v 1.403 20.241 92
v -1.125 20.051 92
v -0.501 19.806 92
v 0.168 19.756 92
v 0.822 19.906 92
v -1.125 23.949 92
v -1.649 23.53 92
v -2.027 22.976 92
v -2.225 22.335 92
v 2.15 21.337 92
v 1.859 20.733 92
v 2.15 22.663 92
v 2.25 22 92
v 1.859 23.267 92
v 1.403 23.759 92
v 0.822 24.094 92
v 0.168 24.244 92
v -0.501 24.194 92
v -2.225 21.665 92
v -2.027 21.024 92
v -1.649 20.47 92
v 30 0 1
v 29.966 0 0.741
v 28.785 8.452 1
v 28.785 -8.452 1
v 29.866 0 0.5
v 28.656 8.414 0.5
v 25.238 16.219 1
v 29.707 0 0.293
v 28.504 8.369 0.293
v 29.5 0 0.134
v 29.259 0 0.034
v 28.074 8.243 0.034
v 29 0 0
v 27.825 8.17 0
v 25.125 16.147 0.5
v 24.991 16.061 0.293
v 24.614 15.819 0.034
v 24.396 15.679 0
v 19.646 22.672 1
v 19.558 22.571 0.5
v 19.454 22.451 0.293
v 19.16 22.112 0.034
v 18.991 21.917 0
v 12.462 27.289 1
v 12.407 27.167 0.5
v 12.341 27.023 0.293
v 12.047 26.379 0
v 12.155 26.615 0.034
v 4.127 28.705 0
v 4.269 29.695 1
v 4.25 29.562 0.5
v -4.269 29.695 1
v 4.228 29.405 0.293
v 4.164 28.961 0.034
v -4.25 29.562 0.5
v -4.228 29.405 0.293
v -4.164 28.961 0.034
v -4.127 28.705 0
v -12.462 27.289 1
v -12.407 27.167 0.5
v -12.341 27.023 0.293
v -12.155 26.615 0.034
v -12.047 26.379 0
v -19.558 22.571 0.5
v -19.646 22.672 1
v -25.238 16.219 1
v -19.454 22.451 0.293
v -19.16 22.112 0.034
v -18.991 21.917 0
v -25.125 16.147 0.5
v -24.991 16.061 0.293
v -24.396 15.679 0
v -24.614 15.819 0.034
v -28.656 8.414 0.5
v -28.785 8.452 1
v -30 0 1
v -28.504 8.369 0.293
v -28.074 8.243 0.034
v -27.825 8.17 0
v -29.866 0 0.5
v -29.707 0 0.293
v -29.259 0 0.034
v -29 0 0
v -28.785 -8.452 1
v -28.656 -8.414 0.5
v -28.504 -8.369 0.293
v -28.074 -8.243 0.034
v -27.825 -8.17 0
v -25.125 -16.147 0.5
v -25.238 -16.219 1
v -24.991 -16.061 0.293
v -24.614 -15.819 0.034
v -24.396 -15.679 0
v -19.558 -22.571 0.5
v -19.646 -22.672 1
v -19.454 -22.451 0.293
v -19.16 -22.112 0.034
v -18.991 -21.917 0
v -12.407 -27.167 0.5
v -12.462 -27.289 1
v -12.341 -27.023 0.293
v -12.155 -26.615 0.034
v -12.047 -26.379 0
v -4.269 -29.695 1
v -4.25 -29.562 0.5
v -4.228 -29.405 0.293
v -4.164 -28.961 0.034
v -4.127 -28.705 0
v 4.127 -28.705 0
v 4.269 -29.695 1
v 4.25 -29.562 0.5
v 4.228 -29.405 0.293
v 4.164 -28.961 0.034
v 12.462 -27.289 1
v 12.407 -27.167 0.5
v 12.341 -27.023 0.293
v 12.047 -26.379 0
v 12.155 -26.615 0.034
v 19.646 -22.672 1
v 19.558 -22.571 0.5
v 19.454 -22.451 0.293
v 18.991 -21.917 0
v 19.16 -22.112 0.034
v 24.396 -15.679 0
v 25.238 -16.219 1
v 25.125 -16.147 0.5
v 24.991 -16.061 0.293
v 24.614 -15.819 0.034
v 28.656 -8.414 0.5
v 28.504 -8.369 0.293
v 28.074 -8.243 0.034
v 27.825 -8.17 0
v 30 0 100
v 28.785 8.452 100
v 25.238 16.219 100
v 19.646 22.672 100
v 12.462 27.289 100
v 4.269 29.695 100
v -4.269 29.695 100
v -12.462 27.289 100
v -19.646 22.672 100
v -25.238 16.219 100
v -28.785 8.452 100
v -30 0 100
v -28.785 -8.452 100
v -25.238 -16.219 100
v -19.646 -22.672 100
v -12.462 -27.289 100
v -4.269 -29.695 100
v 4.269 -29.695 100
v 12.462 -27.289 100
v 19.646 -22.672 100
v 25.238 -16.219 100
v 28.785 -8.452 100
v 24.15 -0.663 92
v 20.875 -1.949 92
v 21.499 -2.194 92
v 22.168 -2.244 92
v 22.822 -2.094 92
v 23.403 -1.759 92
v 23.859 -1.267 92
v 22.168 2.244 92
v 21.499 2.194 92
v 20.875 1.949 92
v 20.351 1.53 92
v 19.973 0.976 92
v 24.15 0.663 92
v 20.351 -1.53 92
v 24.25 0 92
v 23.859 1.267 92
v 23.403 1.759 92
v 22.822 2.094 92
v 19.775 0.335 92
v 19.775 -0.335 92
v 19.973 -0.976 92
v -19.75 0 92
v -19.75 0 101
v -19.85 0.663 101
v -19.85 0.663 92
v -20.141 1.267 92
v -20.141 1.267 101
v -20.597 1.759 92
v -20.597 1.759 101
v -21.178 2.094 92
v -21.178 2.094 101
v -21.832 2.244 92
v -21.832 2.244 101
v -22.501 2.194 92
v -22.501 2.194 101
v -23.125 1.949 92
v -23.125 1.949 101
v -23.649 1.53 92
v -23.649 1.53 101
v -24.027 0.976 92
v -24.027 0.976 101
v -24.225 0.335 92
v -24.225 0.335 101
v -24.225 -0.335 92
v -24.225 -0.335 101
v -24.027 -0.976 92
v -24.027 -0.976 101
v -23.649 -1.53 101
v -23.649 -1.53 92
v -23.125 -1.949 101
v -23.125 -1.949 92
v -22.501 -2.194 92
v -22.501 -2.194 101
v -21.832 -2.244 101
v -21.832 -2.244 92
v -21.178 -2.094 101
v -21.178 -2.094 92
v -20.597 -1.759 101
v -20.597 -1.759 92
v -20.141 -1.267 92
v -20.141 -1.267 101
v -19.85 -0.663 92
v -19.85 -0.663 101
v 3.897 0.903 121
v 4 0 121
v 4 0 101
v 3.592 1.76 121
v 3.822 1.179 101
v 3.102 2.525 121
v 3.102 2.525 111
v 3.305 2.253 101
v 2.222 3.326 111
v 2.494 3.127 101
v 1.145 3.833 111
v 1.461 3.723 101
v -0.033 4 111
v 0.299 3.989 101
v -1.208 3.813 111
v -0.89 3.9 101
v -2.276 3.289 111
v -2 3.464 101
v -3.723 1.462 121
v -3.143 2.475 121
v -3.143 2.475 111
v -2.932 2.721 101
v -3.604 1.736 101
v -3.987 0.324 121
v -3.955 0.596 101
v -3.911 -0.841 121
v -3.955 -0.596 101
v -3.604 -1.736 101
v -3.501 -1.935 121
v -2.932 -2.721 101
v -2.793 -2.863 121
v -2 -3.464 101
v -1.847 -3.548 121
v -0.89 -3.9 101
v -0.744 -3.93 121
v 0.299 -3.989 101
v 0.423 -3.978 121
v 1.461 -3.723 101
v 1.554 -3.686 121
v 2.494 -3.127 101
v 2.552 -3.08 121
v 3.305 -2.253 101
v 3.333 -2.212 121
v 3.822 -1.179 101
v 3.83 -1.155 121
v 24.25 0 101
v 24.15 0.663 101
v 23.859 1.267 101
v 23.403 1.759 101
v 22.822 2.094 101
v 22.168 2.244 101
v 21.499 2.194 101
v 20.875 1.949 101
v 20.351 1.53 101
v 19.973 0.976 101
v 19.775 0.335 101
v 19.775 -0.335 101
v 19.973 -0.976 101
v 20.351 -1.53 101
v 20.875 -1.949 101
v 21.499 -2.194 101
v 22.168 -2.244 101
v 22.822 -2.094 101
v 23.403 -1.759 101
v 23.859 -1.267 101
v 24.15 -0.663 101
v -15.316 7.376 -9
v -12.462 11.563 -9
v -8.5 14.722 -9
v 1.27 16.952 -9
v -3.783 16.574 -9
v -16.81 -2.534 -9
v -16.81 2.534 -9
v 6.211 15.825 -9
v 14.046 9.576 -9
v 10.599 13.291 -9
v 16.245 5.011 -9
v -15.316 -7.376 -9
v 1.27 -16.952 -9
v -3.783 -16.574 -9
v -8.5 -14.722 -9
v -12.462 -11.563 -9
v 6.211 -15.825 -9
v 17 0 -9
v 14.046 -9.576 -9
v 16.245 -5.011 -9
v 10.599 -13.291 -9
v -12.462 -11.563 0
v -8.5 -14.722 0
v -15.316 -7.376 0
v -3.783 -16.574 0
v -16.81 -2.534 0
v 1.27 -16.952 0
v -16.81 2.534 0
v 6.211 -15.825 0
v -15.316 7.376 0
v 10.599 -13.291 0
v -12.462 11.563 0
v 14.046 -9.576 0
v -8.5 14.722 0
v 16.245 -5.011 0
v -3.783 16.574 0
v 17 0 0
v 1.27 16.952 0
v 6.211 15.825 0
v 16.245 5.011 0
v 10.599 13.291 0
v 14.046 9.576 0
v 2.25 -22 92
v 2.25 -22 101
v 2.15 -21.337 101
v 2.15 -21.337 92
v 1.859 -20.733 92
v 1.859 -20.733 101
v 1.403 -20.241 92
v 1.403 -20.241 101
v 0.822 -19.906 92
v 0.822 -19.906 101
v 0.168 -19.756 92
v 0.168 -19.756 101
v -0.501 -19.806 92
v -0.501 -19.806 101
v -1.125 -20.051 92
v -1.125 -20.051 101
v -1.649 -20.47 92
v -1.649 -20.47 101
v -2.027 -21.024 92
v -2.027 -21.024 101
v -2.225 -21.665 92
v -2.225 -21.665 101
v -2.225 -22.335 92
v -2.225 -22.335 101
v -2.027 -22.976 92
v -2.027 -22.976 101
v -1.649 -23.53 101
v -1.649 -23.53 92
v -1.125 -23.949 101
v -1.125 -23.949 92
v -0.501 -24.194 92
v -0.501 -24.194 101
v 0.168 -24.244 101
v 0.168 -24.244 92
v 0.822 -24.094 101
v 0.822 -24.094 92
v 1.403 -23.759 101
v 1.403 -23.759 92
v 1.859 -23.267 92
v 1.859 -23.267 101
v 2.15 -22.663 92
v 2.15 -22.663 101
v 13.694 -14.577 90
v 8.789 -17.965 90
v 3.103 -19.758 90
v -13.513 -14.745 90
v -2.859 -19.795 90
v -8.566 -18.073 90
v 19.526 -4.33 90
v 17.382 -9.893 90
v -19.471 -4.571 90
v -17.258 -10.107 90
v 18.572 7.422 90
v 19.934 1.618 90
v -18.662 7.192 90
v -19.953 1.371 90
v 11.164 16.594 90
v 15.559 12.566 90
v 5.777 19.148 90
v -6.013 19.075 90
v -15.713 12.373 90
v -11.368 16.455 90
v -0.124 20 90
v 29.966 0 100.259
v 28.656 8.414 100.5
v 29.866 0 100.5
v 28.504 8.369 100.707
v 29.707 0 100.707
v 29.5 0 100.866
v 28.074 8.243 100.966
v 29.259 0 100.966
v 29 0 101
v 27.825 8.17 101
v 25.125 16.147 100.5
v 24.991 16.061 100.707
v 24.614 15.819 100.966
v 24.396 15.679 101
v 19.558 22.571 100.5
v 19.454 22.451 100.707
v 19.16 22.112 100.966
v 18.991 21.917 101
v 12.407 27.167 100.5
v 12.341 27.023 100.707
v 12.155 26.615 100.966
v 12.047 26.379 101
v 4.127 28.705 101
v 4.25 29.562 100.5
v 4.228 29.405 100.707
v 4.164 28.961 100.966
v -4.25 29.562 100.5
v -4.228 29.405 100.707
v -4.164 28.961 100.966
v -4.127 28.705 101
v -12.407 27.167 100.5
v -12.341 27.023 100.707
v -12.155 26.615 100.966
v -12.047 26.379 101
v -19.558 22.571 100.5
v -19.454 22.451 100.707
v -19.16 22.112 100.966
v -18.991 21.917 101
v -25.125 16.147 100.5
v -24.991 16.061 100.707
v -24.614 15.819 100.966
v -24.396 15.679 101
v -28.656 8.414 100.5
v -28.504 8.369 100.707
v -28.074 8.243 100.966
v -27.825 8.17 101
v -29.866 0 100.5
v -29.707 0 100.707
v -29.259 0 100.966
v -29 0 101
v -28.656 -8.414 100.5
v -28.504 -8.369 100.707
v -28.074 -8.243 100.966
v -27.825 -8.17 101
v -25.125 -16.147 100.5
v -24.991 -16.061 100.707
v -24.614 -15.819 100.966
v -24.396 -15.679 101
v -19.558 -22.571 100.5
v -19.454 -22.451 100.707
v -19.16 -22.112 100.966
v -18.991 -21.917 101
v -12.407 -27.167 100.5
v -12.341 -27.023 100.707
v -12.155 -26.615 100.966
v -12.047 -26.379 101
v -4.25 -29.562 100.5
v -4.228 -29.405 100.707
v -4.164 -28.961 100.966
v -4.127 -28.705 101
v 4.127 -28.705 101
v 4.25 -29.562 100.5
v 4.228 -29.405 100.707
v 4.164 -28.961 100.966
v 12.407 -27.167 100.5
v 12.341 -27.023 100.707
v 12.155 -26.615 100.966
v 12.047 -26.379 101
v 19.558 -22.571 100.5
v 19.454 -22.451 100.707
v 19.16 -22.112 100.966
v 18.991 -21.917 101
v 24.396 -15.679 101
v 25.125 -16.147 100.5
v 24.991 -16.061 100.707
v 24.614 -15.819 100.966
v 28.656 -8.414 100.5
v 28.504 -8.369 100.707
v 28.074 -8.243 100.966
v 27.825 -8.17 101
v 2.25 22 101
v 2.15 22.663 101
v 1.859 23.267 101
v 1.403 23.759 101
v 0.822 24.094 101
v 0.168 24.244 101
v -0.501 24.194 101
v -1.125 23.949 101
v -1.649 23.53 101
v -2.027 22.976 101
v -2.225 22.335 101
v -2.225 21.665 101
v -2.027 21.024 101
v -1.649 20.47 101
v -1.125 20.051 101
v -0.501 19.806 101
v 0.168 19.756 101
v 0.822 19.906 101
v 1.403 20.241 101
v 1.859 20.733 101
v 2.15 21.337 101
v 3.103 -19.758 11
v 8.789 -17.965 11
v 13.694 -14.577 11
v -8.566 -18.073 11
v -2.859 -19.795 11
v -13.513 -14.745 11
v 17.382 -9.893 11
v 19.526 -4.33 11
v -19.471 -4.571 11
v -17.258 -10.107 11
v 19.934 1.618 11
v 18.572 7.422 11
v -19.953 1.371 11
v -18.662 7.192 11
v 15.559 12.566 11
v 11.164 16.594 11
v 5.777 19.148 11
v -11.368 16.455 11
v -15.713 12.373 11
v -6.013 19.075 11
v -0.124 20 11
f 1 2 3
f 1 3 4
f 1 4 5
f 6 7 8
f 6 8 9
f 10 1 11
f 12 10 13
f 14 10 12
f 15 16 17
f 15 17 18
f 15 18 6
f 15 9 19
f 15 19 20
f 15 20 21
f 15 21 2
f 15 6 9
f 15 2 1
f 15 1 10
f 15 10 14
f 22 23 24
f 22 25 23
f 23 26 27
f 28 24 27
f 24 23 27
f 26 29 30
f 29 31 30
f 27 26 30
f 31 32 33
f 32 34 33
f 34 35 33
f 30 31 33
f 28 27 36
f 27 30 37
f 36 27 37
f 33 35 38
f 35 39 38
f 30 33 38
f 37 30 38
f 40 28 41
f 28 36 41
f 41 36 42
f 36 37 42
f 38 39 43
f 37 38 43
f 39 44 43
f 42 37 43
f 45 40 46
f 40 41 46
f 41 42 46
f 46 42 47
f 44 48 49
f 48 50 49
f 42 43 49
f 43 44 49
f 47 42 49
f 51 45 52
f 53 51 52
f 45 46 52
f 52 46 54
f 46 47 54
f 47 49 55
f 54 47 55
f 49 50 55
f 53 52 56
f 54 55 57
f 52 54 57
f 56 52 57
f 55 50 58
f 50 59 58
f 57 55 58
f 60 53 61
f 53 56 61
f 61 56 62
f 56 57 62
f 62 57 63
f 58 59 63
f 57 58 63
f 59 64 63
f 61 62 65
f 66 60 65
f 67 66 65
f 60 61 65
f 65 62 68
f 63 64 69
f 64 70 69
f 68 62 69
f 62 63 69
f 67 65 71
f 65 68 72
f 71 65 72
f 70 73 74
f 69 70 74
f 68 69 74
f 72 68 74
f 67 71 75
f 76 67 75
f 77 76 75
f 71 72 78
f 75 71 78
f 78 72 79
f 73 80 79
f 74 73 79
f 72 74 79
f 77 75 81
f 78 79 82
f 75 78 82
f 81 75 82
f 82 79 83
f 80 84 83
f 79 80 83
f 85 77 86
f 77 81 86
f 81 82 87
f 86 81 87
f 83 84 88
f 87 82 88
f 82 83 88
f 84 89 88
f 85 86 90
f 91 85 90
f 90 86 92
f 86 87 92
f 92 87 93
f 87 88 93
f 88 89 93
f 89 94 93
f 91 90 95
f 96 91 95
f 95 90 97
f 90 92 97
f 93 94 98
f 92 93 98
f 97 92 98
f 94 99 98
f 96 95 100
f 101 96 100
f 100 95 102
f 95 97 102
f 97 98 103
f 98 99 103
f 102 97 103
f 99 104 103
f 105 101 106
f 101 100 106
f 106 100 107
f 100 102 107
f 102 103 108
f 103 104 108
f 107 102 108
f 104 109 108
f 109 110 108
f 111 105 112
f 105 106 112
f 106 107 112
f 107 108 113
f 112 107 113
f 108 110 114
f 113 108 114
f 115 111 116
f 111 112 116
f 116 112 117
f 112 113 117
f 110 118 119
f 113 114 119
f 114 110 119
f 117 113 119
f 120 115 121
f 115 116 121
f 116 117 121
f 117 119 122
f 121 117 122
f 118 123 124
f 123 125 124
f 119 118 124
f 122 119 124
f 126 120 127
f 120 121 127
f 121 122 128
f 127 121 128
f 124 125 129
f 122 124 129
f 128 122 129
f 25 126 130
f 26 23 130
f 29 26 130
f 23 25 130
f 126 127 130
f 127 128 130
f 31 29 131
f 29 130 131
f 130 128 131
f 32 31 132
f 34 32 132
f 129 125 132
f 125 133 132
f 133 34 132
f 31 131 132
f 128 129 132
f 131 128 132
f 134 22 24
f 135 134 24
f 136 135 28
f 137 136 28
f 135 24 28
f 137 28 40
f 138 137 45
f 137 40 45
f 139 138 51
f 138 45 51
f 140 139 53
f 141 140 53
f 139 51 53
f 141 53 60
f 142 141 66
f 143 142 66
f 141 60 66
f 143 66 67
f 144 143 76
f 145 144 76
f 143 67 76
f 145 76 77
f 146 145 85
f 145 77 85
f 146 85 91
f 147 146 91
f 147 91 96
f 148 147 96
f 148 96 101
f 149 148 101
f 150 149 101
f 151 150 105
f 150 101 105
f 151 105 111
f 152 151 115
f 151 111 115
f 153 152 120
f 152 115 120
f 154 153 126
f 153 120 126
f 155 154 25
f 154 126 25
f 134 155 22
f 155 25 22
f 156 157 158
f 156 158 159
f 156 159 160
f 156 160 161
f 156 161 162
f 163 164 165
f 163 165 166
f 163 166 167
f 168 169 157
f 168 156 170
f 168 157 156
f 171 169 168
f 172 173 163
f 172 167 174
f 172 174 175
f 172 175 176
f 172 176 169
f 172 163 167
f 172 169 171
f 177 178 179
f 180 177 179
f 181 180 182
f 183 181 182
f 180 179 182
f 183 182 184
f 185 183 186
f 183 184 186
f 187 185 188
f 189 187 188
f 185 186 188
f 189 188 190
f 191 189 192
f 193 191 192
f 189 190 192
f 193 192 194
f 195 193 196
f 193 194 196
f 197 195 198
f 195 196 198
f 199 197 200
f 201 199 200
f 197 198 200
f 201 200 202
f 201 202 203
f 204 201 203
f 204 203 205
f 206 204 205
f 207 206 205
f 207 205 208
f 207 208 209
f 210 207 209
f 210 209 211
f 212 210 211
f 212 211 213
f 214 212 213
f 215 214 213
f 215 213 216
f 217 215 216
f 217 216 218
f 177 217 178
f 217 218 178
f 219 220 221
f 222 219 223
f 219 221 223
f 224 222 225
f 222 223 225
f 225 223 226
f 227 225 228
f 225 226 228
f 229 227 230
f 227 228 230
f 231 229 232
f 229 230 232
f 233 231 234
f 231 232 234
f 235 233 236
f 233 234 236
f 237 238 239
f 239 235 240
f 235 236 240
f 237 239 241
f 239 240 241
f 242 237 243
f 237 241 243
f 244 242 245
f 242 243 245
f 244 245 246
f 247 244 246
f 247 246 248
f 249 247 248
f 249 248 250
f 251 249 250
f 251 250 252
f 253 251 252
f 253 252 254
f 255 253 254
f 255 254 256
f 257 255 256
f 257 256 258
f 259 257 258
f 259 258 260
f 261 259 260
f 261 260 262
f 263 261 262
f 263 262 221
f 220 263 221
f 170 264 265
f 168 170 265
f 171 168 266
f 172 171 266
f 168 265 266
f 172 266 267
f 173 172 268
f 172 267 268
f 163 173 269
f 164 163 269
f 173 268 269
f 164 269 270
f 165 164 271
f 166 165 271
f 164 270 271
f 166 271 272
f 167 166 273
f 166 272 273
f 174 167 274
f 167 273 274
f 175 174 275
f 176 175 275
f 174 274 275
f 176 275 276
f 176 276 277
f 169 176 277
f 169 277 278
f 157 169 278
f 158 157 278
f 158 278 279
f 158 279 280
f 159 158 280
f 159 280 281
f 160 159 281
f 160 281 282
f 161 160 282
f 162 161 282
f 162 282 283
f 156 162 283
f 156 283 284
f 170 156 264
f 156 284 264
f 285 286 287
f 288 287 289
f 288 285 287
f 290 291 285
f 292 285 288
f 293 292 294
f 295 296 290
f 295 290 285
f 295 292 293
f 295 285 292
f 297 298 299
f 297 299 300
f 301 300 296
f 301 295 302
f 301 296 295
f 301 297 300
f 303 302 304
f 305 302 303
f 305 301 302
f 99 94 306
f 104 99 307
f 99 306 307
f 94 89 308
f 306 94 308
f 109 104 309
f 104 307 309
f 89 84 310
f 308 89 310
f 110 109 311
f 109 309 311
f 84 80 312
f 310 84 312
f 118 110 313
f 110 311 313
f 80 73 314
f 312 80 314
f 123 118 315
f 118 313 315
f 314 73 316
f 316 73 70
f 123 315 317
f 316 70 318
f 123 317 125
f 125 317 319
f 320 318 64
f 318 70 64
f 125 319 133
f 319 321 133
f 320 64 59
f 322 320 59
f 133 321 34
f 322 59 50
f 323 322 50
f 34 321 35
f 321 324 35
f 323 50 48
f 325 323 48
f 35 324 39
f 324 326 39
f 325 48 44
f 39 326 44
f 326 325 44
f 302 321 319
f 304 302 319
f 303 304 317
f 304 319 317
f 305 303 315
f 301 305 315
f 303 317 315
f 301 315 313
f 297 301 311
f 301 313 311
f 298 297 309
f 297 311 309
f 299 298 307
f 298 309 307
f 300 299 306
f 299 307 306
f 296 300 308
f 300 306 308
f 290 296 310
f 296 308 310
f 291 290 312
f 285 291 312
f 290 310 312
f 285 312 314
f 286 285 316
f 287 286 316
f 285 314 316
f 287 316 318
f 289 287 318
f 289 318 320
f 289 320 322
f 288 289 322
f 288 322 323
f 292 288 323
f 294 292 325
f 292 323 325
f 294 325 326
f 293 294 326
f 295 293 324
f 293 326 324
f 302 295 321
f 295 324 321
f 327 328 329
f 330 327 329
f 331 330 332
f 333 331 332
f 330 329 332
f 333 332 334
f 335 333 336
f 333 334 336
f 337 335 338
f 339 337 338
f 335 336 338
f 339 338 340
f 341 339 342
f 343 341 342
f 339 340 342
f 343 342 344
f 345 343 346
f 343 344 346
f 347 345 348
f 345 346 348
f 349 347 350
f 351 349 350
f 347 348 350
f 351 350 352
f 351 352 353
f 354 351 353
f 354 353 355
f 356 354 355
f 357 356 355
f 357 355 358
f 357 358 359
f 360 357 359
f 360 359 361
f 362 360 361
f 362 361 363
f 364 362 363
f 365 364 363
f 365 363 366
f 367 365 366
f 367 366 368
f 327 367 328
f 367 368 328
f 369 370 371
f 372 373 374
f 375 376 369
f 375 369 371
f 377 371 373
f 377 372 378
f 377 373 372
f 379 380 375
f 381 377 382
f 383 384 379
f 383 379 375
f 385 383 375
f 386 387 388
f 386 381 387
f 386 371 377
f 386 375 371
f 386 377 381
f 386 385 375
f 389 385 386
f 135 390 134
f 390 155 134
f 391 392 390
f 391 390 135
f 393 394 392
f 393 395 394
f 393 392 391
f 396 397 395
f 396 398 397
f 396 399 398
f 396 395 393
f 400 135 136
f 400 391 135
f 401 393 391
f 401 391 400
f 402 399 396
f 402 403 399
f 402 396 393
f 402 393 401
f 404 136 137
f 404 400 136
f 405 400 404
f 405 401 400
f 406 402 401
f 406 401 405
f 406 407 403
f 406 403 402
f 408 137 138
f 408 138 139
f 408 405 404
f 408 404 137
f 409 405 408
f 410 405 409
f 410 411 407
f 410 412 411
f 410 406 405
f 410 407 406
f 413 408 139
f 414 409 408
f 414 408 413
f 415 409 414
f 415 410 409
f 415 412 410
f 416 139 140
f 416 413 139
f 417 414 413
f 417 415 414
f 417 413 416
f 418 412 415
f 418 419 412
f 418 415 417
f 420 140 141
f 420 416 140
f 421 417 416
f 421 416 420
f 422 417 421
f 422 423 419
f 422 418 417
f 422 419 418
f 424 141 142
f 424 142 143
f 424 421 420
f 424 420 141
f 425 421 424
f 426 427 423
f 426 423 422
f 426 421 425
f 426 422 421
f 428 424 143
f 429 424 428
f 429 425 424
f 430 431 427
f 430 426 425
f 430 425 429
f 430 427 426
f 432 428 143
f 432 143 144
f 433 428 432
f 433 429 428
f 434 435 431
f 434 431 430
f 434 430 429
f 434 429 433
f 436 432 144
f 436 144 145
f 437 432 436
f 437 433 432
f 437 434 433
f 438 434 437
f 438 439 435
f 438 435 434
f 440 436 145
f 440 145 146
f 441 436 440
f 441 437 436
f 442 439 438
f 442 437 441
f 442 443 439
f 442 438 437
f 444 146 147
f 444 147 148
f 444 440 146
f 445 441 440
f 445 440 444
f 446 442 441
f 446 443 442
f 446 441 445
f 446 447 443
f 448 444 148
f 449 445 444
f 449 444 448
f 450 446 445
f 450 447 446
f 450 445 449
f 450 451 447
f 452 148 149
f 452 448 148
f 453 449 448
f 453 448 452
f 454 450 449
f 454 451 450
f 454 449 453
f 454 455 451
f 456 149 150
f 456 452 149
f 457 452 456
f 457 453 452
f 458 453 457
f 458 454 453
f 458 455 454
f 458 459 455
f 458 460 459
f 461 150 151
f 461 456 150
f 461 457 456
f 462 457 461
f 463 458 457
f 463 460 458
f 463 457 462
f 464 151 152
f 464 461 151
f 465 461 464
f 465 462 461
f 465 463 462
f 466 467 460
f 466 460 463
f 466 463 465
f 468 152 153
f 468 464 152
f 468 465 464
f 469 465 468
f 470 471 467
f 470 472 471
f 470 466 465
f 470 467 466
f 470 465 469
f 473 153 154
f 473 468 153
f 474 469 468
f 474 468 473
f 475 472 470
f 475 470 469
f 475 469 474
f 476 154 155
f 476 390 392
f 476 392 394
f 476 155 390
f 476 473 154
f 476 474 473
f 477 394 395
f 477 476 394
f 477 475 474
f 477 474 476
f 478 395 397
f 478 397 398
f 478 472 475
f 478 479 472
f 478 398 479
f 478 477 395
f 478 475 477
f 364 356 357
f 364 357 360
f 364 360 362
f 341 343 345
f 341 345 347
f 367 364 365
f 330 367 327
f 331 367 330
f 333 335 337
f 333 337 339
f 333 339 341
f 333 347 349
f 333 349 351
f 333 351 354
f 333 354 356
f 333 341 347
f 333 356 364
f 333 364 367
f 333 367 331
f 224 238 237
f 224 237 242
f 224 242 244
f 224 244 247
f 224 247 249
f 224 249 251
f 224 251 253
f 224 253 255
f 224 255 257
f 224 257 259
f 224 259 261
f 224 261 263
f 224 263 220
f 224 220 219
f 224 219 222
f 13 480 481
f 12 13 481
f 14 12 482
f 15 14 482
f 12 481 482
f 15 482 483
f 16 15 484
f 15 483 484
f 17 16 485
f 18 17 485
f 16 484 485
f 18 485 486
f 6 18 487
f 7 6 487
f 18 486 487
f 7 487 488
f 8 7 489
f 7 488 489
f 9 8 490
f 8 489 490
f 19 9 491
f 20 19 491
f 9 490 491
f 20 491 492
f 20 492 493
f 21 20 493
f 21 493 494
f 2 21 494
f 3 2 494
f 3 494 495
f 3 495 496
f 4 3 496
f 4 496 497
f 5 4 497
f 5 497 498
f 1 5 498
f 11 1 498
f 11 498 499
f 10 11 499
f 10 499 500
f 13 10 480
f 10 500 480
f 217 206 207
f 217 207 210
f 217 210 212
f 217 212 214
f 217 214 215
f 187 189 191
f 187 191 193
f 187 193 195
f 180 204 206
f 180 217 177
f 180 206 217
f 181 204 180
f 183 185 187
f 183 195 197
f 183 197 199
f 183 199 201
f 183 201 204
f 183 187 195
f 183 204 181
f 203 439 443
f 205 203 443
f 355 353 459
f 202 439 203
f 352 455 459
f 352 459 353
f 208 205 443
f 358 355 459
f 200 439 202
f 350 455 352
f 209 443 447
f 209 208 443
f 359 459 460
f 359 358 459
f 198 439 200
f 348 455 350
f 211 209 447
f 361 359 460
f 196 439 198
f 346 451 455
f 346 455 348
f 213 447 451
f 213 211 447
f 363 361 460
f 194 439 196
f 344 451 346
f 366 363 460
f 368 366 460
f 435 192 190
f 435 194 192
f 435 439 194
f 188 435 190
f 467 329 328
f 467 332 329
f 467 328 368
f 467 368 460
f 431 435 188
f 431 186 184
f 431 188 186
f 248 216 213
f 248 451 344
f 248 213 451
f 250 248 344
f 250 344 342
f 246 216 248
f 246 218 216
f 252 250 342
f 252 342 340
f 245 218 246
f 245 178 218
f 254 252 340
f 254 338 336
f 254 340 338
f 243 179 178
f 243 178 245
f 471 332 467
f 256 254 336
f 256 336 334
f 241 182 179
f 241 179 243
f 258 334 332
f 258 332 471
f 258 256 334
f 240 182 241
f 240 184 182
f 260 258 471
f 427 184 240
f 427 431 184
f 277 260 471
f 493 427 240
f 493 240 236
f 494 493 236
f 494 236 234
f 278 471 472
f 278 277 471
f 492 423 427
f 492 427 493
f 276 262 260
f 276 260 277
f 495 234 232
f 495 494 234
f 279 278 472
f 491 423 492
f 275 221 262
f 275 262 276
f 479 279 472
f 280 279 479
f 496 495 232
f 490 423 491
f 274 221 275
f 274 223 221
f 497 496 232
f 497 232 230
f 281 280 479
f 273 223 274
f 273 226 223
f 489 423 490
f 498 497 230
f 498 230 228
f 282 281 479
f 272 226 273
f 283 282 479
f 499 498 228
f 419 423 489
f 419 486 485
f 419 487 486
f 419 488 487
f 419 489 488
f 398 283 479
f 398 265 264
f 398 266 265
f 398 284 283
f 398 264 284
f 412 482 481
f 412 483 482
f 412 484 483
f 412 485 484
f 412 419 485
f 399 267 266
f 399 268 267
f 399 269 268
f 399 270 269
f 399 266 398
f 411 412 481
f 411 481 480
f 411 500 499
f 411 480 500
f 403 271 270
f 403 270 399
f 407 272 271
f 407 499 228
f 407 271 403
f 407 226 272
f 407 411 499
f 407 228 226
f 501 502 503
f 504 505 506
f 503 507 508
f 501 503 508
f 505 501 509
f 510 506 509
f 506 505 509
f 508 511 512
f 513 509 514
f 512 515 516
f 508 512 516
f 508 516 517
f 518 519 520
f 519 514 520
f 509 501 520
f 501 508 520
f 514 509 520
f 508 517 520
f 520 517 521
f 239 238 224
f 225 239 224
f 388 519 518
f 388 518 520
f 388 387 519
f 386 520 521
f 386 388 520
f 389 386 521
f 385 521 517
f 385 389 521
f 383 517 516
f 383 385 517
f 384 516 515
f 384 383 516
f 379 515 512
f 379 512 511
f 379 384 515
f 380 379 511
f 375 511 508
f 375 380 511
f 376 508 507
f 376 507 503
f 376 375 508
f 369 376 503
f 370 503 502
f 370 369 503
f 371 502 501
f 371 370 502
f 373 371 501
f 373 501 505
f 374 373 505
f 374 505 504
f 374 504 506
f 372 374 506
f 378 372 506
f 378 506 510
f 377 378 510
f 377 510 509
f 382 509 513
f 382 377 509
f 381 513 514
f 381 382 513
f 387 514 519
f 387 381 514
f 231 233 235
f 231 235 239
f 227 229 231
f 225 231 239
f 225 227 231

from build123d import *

# Parameters (mm, degrees)
ESQUISSE1_R             = 30
BOSS_EXTRU_1_DEPTH      = 101
ESQUISSE2_R             = 4
BOSS_EXTRU_2_DEPTH      = 20
ENL_V_START             = -10
ENL_V_MAT_EXTRU_1_DEPTH = 10
CONG_1_R                = 1
ESQUISSE4_R             = 17
BOSS_EXTRU_3_DEPTH      = 9
ESQUISSE5_R             = 2.25
ENL_V_MAT_EXTRU_2_DEPTH = 9
ESQUISSE7_W             = 20
ESQUISSE7_H             = 79


with BuildPart() as part:
    # Esquisse1 → Boss.-Extru.1 (new body)
    with BuildSketch(Plane(origin=(0, 0, 0), x_dir=(0, 1, 0), z_dir=(0, 0, 1))):
        with Locations(Location((0, 0, 0), (0, 0, 270))):
            Circle(ESQUISSE1_R)
    extrude(amount=BOSS_EXTRU_1_DEPTH)

    # Esquisse2 → Boss.-Extru.2 (add)
    with BuildSketch(Plane.XY.offset(101)):
        Circle(ESQUISSE2_R)
    extrude(amount=BOSS_EXTRU_2_DEPTH)

    # Esquisse3 → Enlèv. mat.-Extru.1 (cut)
    with BuildSketch(Plane.XY.offset(121).offset(ENL_V_START)):
        with BuildLine():
            Line((-3.142677151, 2.4745869), (3.101981411, 2.5254131))
            ThreePointArc((3.101981411, 2.5254131), (-0.032555514, 3.999867515), (-3.142677151, 2.4745869))
        make_face()
    extrude(amount=ENL_V_MAT_EXTRU_1_DEPTH, mode=Mode.SUBTRACT)

    # Congé1
    cong_1_edges = [part.edges().sort_by_distance(p)[0] for p in [
        (-30, 0, 0),
        (-30, 0, 101),
    ]]
    fillet(cong_1_edges, radius=CONG_1_R)

    # Esquisse4 → Boss.-Extru.3 (add)
    with BuildSketch(Plane(origin=(0, 0, 0), x_dir=(1, 0, 0), z_dir=(0, 0, -1))):
        Circle(ESQUISSE4_R)
    extrude(amount=BOSS_EXTRU_3_DEPTH)

    # Esquisse5 → Enlèv. mat.-Extru.2 (cut)
    with BuildSketch(Plane.XY.offset(101)):
        with Locations((0, 22)):
            Circle(ESQUISSE5_R)
        with Locations((22, 0)):
            Circle(ESQUISSE5_R)
        with Locations((0, -22)):
            Circle(ESQUISSE5_R)
        with Locations((-22, 0)):
            Circle(ESQUISSE5_R)
    extrude(amount=-ENL_V_MAT_EXTRU_2_DEPTH, mode=Mode.SUBTRACT)

    # Esquisse7 → Enlèvement de matière-Révolution1 (revolve, cut)
    with BuildSketch(Plane.YZ, mode=Mode.PRIVATE) as enl_vement_de_mati_re_r_volution1_sk:
        with Locations((-10, 50.5)):
            Rectangle(ESQUISSE7_W, ESQUISSE7_H)
    revolve(enl_vement_de_mati_re_r_volution1_sk.sketch.rotate(Axis((0, 0, 90), (0, 0, -1)), 128.217378369), axis=Axis((0, 0, 90), (0, 0, -1)), mode=Mode.SUBTRACT)


solid = part.part
